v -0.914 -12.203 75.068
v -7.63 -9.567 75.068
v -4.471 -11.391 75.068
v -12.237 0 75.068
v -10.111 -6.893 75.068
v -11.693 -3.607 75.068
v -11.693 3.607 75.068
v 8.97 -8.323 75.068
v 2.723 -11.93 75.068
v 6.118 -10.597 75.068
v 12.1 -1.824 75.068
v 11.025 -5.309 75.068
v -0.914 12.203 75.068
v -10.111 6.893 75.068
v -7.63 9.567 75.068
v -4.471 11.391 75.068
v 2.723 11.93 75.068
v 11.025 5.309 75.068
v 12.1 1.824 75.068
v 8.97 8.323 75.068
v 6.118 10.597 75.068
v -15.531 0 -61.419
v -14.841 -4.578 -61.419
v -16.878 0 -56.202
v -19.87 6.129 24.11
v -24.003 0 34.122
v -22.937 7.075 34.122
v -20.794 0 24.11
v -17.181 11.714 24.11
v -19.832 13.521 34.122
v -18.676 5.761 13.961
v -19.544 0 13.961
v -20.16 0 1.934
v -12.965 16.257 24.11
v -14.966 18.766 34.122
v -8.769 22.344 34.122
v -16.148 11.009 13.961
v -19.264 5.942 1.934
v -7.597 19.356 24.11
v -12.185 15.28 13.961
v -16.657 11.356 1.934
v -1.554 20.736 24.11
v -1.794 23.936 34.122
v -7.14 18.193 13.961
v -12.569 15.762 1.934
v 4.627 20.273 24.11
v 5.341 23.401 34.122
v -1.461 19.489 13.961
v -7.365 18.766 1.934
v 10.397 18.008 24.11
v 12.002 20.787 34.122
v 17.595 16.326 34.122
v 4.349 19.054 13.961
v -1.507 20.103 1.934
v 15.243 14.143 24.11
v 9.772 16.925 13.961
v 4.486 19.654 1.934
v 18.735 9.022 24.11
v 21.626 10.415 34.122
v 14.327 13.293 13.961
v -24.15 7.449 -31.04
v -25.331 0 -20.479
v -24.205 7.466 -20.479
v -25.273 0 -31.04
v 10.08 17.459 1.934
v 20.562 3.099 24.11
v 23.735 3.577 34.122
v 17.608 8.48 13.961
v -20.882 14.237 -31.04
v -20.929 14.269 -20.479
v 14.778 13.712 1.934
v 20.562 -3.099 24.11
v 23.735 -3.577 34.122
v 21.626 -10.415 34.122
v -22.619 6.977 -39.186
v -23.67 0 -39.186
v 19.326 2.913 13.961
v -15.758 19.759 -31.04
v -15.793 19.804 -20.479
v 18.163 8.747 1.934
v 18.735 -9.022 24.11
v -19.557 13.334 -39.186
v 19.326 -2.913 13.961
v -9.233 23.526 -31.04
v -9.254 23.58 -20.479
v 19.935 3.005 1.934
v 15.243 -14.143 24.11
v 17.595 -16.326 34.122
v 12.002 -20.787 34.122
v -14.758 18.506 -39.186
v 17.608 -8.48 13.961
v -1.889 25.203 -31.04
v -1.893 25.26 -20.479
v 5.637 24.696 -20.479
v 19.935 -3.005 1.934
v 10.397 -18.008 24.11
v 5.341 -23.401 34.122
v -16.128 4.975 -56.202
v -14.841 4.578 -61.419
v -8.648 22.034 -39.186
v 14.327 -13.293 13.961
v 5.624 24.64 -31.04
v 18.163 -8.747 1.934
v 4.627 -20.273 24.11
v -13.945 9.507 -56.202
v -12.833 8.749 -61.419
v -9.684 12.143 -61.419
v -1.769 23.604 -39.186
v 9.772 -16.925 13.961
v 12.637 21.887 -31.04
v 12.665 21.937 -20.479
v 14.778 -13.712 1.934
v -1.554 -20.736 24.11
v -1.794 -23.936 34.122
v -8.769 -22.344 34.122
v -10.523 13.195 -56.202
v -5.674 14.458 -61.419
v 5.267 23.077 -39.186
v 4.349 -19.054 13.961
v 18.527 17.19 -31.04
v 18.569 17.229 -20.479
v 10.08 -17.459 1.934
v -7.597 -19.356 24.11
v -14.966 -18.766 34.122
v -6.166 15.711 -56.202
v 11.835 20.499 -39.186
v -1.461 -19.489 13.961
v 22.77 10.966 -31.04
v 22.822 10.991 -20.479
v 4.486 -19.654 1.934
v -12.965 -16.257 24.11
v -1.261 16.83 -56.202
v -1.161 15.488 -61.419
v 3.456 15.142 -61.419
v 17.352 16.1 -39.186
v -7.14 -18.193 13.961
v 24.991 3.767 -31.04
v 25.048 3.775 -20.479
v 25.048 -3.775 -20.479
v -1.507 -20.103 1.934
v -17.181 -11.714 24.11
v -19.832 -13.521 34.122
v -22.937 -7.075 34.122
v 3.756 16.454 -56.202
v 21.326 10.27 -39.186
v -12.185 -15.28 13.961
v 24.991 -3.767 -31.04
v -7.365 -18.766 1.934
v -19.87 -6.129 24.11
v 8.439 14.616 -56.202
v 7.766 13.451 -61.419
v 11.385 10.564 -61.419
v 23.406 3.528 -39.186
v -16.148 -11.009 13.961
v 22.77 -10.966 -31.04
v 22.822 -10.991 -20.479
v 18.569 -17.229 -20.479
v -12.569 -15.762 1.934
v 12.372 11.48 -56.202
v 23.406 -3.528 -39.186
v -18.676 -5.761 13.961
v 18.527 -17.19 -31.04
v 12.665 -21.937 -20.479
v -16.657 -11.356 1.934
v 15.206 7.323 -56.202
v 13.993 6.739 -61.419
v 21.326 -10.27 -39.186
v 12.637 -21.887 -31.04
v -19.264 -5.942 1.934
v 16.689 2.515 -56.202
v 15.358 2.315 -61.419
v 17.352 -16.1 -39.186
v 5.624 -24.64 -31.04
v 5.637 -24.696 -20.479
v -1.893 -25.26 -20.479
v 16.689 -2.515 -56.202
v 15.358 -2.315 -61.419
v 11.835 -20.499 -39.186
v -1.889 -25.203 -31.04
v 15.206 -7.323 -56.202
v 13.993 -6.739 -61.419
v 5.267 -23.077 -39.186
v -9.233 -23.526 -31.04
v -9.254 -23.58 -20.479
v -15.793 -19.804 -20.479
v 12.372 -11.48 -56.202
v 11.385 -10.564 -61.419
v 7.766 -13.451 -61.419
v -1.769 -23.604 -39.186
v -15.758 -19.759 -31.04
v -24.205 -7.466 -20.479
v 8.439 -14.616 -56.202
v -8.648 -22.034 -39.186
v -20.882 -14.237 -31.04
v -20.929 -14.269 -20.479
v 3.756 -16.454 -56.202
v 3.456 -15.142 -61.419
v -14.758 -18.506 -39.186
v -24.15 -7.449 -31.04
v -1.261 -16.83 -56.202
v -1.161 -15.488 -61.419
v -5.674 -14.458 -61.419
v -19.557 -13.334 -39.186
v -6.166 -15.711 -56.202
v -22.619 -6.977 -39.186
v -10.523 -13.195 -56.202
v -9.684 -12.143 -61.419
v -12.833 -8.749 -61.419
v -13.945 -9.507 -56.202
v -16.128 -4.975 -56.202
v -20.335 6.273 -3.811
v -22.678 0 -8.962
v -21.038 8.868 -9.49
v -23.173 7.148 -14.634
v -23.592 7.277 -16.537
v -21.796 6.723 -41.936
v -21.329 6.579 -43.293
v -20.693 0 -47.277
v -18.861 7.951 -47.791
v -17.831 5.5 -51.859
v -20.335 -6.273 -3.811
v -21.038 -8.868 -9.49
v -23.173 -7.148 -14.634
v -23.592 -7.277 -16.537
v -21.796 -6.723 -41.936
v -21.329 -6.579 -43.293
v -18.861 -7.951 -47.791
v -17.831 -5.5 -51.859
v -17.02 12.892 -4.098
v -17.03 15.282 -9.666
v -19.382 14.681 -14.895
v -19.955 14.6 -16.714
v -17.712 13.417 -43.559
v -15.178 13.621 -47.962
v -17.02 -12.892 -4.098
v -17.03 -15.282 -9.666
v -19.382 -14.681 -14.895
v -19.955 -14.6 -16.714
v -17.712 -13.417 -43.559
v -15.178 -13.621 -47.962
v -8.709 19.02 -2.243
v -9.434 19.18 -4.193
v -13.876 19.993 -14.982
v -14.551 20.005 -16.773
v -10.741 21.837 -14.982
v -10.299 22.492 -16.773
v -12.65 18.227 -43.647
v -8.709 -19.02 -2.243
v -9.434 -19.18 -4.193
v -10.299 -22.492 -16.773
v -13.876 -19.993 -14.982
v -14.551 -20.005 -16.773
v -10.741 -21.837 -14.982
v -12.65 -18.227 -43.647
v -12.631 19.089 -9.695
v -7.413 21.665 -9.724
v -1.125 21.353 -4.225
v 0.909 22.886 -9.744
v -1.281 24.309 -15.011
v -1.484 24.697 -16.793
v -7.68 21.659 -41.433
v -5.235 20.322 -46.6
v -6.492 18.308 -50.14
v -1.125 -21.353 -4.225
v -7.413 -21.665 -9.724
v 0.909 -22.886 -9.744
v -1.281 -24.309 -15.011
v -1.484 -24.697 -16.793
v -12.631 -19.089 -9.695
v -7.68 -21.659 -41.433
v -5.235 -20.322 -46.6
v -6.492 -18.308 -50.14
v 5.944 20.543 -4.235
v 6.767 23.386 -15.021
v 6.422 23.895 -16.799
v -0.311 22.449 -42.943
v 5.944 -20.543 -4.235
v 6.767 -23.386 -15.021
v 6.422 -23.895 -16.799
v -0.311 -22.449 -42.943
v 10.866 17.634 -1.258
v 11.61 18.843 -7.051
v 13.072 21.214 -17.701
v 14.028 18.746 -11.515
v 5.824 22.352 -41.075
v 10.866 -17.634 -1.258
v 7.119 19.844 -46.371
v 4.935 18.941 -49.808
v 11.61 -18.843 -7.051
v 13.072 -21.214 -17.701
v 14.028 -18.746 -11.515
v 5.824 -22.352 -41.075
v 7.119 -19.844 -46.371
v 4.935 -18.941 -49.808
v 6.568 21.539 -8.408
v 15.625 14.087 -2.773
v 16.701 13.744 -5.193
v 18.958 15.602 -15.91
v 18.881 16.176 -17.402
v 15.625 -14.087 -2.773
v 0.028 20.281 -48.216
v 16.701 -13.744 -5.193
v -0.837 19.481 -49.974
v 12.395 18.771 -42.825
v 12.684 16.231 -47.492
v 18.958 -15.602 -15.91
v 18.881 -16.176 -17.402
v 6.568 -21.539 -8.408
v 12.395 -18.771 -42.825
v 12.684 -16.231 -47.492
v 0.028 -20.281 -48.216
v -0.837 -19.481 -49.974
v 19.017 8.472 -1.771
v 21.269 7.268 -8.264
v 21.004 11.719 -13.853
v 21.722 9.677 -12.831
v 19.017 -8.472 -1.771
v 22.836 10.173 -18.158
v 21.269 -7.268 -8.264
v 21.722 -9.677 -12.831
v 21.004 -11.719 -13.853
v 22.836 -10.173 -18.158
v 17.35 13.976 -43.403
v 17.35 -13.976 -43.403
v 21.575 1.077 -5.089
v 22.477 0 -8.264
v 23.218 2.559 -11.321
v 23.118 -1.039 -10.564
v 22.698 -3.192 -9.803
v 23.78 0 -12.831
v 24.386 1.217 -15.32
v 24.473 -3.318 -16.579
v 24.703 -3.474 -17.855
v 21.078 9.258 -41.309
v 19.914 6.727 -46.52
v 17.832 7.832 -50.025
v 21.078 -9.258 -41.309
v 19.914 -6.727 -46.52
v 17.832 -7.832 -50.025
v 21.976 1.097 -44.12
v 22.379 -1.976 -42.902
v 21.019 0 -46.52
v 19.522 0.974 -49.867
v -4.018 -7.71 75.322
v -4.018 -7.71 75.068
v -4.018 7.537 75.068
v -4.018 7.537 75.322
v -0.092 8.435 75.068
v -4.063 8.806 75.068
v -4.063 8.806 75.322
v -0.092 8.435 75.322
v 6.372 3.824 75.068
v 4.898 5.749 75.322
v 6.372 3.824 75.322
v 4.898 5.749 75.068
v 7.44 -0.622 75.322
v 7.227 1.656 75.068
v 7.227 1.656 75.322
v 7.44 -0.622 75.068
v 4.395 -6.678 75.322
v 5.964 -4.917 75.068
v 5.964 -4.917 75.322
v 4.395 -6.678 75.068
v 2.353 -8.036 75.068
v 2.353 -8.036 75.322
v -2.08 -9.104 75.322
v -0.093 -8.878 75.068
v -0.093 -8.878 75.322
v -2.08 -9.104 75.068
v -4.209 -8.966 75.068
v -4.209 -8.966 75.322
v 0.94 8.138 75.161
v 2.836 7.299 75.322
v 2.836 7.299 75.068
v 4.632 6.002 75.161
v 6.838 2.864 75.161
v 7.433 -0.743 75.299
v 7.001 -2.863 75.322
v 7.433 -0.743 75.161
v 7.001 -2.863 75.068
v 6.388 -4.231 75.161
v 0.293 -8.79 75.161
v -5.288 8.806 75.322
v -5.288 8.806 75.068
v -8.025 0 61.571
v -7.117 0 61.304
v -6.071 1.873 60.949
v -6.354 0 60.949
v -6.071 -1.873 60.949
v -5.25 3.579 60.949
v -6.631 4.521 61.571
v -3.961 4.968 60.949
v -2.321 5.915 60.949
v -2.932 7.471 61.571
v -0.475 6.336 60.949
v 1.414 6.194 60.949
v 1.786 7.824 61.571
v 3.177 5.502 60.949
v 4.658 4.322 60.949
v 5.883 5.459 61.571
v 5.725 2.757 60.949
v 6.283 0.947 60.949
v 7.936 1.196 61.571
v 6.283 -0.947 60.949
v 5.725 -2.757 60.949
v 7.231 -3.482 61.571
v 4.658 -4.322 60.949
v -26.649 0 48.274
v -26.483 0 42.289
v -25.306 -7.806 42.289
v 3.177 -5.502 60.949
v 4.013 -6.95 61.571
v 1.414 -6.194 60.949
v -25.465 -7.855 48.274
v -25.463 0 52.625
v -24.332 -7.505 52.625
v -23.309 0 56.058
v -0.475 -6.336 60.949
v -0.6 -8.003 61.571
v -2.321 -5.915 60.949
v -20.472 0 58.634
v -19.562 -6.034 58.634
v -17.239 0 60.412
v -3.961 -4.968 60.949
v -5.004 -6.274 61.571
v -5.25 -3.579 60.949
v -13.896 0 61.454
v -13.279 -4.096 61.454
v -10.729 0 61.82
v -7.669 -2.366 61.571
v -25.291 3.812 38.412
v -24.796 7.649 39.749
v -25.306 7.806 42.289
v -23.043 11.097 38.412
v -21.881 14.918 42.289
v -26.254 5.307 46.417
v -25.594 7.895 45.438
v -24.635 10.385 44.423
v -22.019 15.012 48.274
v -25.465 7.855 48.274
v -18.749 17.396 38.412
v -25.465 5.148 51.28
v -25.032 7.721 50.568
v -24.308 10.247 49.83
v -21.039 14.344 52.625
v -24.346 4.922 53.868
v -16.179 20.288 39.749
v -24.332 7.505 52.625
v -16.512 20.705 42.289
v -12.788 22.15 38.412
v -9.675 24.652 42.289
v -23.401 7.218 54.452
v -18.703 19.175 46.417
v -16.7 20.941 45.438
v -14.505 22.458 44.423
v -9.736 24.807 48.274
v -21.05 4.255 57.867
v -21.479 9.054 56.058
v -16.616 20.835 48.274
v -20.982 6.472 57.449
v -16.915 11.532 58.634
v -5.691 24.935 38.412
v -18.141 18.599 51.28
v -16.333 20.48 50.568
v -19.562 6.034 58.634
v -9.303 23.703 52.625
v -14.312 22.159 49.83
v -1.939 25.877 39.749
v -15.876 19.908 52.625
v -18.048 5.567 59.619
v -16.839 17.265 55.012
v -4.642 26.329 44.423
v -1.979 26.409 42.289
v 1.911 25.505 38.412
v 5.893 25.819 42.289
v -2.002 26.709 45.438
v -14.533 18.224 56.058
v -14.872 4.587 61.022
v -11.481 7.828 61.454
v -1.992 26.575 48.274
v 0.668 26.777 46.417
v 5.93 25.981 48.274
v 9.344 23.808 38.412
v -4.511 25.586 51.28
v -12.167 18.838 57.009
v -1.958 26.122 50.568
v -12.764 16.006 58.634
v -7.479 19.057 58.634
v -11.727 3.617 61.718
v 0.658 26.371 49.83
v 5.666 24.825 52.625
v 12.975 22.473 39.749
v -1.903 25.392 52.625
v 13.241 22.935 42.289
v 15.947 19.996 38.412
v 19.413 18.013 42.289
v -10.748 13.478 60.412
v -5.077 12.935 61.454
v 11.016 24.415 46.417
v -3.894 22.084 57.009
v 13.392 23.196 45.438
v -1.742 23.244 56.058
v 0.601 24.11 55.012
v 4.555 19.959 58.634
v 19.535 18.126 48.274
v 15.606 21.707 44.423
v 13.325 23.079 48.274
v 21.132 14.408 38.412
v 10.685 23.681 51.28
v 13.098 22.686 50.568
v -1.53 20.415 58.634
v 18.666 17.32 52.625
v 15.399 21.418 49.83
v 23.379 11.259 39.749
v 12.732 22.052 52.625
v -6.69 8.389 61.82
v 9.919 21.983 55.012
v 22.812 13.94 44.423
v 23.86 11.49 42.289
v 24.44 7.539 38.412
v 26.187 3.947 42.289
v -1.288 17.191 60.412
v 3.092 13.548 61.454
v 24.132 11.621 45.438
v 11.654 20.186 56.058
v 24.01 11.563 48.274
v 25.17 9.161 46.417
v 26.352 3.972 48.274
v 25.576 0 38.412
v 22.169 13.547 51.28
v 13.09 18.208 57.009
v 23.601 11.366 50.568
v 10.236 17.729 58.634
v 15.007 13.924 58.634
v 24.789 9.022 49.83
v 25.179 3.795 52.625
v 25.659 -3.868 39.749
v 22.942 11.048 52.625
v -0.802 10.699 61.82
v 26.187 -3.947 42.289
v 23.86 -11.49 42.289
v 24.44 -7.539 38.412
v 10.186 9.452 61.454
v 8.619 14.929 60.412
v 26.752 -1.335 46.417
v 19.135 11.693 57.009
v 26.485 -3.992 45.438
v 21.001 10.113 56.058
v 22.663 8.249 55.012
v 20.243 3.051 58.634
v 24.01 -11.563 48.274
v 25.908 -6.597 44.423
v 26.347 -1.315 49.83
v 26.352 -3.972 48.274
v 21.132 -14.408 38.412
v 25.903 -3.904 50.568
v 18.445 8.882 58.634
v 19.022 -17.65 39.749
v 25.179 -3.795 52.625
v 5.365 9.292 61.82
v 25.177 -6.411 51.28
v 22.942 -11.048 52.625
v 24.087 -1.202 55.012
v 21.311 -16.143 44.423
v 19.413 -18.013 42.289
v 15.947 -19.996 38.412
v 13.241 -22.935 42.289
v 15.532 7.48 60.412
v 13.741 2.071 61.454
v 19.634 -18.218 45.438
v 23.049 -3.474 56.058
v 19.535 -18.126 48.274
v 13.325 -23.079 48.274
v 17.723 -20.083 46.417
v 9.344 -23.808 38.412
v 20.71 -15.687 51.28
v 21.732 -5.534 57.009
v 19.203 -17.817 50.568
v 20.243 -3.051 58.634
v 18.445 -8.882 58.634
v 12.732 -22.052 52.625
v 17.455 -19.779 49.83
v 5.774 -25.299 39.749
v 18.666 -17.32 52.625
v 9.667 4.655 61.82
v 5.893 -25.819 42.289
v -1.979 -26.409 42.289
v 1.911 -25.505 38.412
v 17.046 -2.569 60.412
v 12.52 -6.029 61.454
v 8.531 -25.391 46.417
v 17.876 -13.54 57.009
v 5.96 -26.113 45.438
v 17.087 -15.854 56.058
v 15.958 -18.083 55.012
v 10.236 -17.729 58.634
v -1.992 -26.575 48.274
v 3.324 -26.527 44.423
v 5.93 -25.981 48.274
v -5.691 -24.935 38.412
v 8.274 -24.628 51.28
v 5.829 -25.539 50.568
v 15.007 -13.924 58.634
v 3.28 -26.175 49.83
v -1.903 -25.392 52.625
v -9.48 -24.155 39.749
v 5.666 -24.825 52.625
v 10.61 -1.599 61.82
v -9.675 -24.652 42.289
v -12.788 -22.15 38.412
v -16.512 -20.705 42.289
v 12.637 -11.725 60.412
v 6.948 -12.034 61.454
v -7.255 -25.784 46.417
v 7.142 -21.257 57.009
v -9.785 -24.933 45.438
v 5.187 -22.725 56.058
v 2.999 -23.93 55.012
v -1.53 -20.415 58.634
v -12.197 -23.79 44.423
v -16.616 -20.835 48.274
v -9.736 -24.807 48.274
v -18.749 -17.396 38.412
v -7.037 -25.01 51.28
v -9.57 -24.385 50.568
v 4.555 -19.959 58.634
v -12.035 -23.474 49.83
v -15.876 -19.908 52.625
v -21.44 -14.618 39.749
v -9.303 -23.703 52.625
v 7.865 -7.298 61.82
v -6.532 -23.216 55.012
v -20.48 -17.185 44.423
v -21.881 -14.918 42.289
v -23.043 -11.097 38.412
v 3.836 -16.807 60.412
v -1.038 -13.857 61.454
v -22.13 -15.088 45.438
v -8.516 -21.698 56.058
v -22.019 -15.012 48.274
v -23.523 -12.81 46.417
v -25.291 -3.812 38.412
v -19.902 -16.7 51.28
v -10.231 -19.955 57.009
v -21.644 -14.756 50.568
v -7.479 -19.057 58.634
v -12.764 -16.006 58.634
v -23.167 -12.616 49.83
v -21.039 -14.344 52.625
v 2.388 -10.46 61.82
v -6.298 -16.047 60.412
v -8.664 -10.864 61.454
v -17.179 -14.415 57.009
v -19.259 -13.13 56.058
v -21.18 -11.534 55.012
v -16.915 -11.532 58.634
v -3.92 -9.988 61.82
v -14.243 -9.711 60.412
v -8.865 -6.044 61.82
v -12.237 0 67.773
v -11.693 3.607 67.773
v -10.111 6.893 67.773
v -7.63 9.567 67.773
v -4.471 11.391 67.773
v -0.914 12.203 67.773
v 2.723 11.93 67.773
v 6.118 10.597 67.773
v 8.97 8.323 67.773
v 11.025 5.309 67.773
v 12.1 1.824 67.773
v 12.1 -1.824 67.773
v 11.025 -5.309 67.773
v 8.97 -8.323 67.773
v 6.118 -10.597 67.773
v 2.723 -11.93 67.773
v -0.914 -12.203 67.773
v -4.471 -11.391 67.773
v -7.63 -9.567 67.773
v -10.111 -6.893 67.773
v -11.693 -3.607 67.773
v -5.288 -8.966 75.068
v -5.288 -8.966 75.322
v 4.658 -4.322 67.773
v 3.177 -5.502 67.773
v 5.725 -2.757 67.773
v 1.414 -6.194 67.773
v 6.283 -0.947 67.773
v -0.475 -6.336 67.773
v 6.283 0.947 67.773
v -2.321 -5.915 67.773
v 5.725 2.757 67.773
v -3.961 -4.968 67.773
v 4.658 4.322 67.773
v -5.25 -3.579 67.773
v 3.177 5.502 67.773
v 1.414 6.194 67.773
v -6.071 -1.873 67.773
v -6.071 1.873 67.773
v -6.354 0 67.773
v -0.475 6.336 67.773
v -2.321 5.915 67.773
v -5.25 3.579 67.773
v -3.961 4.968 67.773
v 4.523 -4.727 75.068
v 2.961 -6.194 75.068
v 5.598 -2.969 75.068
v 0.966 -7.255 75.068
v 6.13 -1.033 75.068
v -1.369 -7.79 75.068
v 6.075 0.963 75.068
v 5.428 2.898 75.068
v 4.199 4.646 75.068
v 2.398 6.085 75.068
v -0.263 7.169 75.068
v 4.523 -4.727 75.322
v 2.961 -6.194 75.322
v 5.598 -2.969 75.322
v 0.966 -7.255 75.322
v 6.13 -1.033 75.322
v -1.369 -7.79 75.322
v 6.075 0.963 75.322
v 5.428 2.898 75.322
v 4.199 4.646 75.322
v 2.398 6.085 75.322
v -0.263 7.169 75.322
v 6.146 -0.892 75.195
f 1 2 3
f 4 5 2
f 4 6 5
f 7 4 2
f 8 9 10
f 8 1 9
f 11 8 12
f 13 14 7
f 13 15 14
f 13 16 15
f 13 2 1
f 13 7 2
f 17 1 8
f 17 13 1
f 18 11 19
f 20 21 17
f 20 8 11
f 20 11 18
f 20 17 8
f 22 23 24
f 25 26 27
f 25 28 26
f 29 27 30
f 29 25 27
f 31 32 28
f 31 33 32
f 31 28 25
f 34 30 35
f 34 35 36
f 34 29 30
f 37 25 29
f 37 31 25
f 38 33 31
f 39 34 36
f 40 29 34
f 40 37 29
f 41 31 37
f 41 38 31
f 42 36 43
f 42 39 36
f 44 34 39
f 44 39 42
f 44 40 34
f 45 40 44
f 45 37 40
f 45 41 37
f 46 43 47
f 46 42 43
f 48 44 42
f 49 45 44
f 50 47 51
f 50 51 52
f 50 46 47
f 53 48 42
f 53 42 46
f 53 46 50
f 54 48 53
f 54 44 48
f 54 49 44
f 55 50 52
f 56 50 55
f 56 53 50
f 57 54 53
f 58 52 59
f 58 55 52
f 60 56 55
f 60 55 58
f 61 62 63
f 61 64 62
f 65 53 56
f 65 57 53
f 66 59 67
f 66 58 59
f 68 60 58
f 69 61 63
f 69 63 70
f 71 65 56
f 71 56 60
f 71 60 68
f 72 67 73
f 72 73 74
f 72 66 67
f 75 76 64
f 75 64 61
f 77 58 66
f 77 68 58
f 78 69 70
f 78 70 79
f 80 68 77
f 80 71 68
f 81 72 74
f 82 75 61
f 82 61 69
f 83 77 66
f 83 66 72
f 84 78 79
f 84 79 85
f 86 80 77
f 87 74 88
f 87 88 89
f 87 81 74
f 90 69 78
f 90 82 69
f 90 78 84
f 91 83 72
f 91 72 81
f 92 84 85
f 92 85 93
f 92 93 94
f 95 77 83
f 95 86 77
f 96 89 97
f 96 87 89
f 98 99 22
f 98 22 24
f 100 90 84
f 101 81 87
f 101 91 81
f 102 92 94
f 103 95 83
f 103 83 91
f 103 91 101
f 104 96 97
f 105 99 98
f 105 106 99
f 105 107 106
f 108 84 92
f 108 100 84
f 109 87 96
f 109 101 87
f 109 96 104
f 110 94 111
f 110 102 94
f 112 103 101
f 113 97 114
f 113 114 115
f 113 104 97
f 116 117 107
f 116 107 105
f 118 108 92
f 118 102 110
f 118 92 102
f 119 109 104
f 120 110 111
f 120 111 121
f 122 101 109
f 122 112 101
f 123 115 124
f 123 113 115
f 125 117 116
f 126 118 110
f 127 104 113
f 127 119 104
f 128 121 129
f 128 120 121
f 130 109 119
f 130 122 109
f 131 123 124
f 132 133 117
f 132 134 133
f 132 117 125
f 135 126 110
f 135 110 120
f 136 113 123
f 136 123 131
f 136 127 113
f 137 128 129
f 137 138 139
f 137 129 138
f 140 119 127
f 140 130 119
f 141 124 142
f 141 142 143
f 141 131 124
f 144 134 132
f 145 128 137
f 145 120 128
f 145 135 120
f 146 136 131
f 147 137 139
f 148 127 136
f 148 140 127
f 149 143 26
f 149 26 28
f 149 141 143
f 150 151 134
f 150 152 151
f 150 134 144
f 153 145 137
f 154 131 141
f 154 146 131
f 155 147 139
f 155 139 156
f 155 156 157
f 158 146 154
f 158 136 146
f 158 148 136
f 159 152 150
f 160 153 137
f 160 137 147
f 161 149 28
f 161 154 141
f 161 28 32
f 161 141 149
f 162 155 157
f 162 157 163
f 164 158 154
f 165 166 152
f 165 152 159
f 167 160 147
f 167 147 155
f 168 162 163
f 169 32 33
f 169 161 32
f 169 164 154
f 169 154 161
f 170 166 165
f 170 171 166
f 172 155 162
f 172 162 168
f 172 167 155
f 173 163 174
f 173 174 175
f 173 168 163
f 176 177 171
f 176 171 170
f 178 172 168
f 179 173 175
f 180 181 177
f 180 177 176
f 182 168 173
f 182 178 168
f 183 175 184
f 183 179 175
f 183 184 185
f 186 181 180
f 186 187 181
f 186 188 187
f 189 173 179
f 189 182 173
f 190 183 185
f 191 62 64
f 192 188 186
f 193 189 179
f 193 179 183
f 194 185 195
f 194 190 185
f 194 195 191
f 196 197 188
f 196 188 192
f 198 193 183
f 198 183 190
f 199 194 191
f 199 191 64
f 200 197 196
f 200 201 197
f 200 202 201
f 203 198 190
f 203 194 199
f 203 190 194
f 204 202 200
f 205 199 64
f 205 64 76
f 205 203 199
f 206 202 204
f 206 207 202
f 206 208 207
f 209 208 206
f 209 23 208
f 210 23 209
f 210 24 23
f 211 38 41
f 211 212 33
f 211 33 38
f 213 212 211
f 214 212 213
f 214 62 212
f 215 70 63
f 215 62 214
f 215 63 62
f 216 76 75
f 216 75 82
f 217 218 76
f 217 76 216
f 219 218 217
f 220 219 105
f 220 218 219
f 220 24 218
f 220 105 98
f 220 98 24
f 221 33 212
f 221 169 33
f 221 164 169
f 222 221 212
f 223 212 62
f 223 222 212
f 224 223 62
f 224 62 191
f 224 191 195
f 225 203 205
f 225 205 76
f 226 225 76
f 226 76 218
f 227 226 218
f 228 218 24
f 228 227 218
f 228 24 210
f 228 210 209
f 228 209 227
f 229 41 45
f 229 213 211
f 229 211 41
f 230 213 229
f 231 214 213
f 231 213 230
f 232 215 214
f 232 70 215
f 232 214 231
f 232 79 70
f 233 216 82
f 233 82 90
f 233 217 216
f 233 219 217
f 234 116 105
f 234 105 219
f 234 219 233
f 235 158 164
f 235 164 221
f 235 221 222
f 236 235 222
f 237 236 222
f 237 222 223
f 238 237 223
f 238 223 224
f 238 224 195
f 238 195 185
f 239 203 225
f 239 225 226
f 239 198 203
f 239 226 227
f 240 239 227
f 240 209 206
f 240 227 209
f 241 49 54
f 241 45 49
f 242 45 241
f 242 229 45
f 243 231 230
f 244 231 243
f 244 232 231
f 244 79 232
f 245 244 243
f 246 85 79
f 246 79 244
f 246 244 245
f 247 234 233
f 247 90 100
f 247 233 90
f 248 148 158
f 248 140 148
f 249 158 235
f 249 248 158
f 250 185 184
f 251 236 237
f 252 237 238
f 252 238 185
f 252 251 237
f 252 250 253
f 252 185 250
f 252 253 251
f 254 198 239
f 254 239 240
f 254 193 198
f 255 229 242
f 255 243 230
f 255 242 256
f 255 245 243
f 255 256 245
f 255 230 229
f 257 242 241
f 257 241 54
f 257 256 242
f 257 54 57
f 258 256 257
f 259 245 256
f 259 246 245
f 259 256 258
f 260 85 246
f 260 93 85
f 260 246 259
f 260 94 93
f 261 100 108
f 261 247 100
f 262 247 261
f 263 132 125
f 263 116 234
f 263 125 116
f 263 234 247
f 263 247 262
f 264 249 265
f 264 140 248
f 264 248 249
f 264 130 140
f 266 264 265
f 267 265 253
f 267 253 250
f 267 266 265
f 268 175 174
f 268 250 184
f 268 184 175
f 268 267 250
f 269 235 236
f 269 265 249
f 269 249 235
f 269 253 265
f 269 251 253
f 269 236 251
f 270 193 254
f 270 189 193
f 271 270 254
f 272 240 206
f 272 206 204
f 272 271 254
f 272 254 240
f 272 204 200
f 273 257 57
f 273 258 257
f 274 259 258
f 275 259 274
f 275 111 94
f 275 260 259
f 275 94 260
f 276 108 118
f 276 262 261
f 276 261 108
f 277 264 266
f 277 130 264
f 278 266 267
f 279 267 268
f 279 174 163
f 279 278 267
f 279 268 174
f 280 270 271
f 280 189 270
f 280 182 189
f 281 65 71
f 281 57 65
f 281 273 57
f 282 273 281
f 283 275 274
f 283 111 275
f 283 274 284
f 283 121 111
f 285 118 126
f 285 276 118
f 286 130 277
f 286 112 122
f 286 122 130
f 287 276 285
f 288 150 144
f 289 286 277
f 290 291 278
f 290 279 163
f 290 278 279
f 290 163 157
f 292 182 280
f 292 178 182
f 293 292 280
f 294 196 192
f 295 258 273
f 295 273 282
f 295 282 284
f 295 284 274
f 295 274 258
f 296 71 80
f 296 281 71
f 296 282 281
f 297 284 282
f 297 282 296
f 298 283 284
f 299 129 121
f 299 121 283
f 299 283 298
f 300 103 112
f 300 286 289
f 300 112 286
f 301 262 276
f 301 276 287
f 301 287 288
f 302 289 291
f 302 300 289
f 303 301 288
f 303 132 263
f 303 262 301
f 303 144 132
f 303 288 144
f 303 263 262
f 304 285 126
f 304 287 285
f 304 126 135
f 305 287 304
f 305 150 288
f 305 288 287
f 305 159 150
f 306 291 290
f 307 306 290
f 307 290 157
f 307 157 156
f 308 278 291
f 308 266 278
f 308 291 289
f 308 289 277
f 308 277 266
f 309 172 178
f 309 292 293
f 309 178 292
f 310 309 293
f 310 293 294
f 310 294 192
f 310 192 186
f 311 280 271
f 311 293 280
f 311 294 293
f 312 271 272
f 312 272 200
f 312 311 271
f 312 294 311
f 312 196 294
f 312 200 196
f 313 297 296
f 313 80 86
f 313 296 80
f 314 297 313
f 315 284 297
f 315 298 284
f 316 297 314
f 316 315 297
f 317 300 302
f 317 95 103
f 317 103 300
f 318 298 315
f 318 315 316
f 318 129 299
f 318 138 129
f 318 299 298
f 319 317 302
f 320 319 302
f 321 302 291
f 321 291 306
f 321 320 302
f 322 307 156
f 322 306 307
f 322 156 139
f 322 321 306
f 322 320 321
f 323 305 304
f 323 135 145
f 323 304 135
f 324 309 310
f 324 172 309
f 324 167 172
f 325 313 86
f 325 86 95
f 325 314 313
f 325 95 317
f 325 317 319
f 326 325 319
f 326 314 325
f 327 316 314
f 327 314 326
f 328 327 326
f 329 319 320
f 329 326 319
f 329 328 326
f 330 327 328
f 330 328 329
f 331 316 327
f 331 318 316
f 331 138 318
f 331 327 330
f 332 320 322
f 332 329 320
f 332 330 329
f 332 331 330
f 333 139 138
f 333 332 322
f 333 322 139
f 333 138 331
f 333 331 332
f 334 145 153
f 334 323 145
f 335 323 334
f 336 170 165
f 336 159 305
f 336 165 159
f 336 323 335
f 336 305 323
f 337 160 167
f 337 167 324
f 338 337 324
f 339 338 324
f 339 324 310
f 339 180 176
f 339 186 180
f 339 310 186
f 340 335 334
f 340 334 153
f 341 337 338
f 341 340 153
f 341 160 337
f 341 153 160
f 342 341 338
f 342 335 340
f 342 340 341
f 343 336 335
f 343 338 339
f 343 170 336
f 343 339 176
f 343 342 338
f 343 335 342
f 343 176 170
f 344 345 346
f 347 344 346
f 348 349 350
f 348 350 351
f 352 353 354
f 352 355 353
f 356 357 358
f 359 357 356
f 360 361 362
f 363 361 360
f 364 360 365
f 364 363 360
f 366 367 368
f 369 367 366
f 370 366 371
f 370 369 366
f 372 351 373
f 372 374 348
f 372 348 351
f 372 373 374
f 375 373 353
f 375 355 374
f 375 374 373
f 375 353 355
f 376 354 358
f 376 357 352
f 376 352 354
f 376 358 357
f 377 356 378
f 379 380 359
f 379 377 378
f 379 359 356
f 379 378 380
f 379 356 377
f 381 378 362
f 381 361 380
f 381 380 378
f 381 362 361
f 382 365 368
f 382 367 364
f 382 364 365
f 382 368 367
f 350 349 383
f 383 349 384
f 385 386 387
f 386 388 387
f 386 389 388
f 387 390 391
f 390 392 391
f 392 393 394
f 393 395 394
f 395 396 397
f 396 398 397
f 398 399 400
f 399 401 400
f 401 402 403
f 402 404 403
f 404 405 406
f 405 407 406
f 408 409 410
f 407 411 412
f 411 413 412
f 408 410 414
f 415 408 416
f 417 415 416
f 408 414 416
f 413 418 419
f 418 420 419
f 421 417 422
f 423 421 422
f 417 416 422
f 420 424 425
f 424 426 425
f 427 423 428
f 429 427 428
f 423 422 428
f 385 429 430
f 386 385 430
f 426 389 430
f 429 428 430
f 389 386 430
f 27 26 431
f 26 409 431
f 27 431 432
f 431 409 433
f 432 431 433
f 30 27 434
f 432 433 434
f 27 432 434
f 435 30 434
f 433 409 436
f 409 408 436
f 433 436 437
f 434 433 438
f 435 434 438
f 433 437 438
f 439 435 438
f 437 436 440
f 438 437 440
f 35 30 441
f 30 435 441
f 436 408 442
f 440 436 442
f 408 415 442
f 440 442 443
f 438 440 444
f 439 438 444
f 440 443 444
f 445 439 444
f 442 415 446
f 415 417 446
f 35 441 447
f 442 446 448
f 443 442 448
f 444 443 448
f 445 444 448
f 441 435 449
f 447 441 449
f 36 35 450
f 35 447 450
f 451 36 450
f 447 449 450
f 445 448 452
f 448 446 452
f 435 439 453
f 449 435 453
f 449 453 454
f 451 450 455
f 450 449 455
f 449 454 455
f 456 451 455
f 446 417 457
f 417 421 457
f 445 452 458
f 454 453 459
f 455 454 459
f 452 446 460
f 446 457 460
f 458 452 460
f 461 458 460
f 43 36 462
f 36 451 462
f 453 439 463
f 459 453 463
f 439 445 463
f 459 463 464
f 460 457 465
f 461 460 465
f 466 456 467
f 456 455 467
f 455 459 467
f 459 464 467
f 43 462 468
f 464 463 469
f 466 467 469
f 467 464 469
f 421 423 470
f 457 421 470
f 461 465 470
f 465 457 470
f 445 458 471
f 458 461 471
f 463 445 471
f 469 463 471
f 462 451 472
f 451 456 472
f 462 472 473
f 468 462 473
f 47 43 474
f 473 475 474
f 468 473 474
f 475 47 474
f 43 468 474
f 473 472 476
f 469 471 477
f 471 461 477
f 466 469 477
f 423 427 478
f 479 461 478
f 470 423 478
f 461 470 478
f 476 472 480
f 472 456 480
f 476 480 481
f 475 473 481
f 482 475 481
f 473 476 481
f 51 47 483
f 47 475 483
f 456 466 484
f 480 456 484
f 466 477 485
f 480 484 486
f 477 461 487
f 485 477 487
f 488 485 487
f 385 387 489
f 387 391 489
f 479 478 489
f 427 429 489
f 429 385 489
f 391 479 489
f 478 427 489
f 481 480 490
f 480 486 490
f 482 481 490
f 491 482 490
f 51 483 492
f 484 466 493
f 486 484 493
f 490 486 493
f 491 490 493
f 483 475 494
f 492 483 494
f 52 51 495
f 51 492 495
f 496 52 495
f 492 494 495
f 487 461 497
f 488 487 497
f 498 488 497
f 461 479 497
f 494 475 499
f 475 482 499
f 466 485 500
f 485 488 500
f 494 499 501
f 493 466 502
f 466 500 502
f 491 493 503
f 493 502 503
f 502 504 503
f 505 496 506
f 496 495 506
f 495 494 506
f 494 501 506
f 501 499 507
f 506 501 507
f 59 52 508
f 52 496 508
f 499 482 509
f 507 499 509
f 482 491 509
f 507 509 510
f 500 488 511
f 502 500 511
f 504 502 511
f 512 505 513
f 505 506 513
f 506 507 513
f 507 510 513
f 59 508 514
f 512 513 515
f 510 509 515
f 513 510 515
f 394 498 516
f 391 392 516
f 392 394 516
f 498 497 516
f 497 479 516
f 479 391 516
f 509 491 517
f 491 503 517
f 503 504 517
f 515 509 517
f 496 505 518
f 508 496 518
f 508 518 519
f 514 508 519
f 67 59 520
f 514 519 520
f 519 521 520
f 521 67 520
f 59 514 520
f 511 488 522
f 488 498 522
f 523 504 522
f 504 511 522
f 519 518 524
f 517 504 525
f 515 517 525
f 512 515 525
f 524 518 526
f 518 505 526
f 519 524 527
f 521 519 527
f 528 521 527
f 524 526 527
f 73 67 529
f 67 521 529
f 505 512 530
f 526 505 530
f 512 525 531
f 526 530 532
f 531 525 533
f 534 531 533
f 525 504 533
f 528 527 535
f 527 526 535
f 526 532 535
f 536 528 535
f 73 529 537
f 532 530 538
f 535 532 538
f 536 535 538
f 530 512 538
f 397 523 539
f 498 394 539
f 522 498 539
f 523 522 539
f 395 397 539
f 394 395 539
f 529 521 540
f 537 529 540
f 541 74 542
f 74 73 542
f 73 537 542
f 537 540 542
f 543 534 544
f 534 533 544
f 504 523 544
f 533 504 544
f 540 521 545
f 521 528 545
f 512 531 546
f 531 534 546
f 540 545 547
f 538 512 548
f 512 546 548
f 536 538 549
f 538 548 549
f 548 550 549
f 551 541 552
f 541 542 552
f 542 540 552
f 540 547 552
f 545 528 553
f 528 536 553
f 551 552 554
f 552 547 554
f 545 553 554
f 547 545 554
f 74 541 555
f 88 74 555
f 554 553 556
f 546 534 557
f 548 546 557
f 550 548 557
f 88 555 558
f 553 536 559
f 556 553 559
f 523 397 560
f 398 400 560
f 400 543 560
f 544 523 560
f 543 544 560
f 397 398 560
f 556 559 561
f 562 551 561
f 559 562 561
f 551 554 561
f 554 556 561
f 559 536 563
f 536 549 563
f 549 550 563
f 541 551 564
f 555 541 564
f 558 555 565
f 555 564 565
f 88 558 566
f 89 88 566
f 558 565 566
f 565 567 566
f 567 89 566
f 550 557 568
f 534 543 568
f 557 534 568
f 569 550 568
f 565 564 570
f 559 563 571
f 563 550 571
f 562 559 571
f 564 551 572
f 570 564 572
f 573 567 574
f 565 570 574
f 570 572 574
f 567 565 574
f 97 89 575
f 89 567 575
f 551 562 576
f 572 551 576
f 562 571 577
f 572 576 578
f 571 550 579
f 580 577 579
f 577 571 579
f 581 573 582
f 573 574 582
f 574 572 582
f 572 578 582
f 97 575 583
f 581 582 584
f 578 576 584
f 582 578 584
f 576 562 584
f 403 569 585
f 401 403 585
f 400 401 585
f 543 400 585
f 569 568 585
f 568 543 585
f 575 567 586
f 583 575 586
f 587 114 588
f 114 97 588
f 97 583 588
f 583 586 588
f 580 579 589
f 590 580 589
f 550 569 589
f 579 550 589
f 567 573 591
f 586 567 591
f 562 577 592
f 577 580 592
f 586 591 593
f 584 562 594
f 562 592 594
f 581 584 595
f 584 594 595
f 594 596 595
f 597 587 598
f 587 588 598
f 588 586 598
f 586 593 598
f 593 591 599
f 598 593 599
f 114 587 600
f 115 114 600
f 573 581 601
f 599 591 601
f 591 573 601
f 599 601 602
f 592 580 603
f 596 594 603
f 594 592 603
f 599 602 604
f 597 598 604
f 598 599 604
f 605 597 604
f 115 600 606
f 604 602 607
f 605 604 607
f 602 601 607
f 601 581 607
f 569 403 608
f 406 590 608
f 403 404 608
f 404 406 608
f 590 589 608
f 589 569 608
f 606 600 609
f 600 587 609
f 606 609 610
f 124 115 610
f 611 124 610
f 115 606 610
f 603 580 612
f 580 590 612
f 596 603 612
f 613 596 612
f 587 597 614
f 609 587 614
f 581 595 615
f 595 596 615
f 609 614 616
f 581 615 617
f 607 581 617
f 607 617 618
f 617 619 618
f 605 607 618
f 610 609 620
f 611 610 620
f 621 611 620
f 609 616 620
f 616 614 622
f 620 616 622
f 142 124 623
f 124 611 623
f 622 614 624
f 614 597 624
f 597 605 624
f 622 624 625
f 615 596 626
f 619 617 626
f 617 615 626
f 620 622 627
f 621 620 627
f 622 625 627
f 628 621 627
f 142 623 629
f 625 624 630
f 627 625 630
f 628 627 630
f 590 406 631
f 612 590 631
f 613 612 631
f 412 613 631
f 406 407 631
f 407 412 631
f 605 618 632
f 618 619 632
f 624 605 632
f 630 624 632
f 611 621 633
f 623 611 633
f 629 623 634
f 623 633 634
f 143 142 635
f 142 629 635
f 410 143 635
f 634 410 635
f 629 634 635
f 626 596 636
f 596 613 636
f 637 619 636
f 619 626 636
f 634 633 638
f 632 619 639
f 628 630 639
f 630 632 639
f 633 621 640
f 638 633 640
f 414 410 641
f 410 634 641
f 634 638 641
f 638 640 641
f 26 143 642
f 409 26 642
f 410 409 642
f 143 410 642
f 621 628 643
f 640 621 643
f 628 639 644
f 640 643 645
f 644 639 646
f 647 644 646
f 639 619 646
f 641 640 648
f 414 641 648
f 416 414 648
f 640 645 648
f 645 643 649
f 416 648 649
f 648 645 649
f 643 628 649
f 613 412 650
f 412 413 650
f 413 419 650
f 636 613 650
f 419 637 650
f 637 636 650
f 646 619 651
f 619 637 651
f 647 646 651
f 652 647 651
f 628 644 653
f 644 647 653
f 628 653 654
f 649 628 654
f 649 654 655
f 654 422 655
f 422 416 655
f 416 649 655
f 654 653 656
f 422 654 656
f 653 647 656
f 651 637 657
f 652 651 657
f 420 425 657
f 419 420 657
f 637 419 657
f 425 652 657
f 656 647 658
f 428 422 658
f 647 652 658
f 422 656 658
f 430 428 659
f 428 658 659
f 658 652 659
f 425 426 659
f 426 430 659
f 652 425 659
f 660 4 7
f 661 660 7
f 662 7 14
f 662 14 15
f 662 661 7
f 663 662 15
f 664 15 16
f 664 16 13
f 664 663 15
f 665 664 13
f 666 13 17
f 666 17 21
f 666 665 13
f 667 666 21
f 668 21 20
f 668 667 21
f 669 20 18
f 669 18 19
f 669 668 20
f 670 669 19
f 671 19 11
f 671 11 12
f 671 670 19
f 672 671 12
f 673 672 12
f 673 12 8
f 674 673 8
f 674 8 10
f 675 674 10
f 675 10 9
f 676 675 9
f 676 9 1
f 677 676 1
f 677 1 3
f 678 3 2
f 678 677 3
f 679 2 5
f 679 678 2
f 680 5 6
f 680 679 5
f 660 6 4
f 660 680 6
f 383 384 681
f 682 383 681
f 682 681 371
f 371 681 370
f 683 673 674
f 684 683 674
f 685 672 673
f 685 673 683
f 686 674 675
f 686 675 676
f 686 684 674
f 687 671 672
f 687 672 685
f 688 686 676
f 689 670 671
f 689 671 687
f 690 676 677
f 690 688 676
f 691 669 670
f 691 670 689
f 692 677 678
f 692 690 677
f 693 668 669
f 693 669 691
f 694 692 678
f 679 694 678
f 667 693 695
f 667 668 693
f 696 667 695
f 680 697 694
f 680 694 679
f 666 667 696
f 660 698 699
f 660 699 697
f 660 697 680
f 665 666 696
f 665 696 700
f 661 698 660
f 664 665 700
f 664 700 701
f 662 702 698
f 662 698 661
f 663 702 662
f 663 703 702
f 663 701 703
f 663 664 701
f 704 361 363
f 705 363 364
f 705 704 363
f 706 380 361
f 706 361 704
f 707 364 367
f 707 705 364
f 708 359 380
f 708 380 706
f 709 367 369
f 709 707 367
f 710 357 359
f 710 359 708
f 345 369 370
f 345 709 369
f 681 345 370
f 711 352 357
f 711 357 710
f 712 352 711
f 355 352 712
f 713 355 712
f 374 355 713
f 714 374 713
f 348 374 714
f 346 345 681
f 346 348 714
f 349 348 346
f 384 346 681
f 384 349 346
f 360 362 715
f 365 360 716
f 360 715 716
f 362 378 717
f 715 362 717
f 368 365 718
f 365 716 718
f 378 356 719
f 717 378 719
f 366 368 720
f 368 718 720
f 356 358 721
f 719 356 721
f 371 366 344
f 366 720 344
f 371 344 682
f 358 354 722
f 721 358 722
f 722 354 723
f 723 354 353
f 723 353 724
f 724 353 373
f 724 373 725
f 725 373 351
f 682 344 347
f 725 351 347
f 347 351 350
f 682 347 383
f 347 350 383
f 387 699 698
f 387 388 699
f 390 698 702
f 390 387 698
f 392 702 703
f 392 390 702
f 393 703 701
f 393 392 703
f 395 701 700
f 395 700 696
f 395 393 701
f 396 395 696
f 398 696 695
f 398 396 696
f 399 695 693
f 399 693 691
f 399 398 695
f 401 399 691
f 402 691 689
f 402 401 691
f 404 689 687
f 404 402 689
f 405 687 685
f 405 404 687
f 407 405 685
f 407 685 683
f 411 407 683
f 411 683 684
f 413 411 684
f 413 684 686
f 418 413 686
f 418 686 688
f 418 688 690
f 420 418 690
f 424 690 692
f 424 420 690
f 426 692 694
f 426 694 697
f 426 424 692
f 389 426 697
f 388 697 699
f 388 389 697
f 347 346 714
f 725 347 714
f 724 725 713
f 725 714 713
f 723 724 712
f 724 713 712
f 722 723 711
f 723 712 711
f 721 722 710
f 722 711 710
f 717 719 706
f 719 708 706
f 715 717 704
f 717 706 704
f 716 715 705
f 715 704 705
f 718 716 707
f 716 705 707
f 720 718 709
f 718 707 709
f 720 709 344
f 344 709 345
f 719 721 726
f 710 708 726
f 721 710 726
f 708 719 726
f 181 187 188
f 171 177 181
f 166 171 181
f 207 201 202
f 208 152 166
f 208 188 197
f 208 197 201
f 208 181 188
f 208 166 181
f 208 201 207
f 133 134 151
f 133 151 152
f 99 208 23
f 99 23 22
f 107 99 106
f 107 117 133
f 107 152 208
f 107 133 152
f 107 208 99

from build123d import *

# Parameters (mm, degrees)
F3_DEPTH = 0.254


# Not quite as in the source:
# - the dataset's text gives a spline's control points without its knots; the knots are read off the source's solid


with BuildPart() as f1:
    # F0 (on Front) → F1 (revolve)
    with BuildSketch(Plane.XZ):
        with BuildLine():
            add(Edge.make_bspline(
                [(-24.00300093, 34.1219119728), (-34.5925595611, 58.8308796287), (-12.001500465, 64.243324101), (-6.3537359238, 60.9487965703)],
                knots=[0, 0, 0, 0, 32.1119649425, 32.1119649425, 32.1119649425, 32.1119649425], degree=3))
            add(Edge.make_bspline(
                [(-24.00300093, 34.1219119728), (-18.9536922311, 22.7837625244), (-18.5681374824, -0.2470894327), (-26.8785367938, -18.6238056214), (-24.691088195, -42.1466133195), (-16.1825619965, -55.7671880803), (-15.5313527212, -61.4194460213)],
                knots=[0.203666813, 0.203666813, 0.203666813, 0.203666813, 0.4410776761, 0.6217292798, 0.8149119798, 1, 1, 1, 1], degree=3))
            Line((-15.5313527212, -61.4194460213), (0, -61.4194460213))
            Line((0, -61.4194460213), (0, 75.068205595))
            Line((0, 75.068205595), (-12.2368233278, 75.068205595))
            Line((-12.2368233278, 75.068205595), (-12.2368233278, 67.7731782198))
            Line((-12.2368233278, 67.7731782198), (-6.3537359238, 67.7731782198))
            Line((-6.3537359238, 67.7731782198), (-6.3537359238, 60.9487965703))
        make_face()
    revolve(axis=Axis((0, 0, 6.8243797868), (0, 0, -1)))


with BuildPart() as f3:
    # F2 (on face) → F3 (new body)
    with BuildSketch(Plane.XY.offset(75.068205595)):
        with BuildLine():
            add(Edge.make_bspline(
                [(-4.062971086, 8.8058835483), (-2.1933640147, 8.8714837532), (1.157297254, 8.386143894), (4.8815568375, 6.1718222853), (6.7372592969, 3.4796927349), (7.4115294482, 1.0933105566), (7.5036193193, -0.7473994059), (7.1702119433, -2.5600192903), (6.4470817235, -4.2581784287), (5.3703358944, -5.7927542709), (3.5050178222, -7.5465765347), (0.4402015685, -9.0509652568), (-2.5993347226, -9.2105905441), (-4.2094985396, -8.9655655025)],
                knots=[0, 0, 0, 0, 0.125, 0.25, 0.375, 0.4375, 0.5, 0.5625, 0.625, 0.6875, 0.75, 0.875, 1, 1, 1, 1], degree=3))
            Line((-4.062971086, 8.8058835483), (-5.2884371173, 8.8058835483))
            Line((-5.2884371173, 8.8058835483), (-5.2884371173, 7.5366646051))
            Line((-5.2884371173, 7.5366646051), (-5.2884371173, -7.7100195922))
            Line((-5.2884371173, -7.7100195922), (-5.2884371173, -8.9655655025))
            Line((-5.2884371173, -8.9655655025), (-4.2094985396, -8.9655655025))
        make_face()
        with BuildLine():
            Line((-4.0184371173, -7.7100195922), (-4.0184371173, 7.5366646051))
            add(Edge.make_bspline(
                [(-4.0184371173, 7.5366646051), (3.0470998026, 7.7845780179), (9.9553181322, -1.0778744554), (1.6835748684, -8.5777174681), (-4.0184371173, -7.7100195922)],
                knots=[0, 0, 0, 0, 0.509491159, 1, 1, 1, 1], degree=3))
        make_face(mode=Mode.SUBTRACT)
    extrude(amount=F3_DEPTH)


solid = Compound([f1.part, f3.part])
